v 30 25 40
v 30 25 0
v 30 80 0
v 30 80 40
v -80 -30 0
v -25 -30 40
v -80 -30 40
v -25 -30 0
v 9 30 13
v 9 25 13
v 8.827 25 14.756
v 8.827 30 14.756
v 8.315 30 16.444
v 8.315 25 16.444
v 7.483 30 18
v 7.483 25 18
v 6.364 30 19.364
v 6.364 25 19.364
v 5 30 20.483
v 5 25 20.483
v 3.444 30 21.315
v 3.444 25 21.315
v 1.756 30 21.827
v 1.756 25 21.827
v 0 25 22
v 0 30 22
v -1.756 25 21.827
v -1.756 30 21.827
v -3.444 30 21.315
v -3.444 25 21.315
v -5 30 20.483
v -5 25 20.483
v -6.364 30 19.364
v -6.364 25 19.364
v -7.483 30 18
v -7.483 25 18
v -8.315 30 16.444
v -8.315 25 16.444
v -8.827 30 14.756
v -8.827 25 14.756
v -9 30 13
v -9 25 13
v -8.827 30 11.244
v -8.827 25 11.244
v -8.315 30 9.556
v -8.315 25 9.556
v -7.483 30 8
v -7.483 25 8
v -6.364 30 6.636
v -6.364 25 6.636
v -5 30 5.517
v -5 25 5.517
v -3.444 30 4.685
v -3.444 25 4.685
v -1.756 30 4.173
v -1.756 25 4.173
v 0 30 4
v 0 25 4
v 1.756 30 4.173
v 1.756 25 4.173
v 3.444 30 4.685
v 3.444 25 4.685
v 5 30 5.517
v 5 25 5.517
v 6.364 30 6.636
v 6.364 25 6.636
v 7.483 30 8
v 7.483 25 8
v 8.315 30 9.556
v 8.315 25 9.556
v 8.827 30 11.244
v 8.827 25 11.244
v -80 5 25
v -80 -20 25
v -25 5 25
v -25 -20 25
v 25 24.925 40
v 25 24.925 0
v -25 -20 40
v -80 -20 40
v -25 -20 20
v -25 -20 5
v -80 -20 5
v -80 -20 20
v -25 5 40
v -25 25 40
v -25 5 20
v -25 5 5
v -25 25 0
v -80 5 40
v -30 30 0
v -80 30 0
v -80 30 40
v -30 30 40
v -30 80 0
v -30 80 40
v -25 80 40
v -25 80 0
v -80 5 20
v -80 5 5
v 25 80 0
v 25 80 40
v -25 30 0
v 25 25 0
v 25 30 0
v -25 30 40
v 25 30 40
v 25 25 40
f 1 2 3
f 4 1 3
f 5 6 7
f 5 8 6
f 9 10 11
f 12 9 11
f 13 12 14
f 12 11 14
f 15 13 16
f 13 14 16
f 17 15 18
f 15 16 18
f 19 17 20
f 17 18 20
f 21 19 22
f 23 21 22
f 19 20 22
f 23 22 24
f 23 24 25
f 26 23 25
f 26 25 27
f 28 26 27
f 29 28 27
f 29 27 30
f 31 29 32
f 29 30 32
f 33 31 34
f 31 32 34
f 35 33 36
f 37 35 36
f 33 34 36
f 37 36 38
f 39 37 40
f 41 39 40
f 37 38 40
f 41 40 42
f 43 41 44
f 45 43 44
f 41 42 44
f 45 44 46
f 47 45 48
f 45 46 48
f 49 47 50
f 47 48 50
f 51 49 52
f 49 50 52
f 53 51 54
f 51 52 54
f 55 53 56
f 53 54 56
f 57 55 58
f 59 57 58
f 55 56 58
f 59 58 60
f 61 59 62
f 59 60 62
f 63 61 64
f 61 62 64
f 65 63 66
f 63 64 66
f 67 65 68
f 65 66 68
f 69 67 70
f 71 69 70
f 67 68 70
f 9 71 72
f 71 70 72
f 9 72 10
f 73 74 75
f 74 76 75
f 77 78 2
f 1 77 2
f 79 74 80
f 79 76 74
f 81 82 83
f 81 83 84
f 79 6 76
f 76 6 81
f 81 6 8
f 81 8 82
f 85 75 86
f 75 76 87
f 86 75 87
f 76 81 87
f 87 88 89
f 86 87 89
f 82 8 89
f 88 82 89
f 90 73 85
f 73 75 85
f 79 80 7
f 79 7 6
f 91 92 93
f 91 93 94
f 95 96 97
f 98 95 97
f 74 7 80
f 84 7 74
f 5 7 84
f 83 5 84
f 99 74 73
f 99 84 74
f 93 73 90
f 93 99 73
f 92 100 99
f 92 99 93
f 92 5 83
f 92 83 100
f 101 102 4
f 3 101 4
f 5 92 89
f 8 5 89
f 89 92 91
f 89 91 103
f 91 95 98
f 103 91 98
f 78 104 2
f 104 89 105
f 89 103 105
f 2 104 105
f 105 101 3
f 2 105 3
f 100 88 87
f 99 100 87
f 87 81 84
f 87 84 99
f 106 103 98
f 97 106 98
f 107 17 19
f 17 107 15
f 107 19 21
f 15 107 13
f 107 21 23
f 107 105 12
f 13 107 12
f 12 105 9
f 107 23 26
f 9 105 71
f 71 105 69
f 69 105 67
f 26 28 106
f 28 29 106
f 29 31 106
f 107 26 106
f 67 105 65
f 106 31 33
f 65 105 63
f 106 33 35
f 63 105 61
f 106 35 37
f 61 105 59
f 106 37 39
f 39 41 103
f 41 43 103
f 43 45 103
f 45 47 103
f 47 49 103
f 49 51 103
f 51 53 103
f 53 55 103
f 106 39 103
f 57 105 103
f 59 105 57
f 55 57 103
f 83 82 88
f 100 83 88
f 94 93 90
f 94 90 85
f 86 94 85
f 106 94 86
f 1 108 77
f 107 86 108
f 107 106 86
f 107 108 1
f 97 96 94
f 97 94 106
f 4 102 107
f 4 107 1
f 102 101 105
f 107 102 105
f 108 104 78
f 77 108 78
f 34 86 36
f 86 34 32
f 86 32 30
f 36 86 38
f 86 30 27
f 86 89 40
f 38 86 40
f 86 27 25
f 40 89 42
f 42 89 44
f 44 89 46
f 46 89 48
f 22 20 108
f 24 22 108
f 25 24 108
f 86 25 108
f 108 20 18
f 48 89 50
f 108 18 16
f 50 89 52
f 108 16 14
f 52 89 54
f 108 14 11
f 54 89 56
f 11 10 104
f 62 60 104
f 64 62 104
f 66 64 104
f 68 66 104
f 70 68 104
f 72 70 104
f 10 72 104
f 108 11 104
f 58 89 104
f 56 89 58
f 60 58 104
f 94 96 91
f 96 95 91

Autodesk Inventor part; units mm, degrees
ref_plane "YZ Plane" through (0, 0, 0) normal (1, 0, 0) x (0, 1, 0)
ref_plane "XZ Plane" through (0, 0, 0) normal (0, 1, 0) x (-1, 0, 0)
ref_plane "XY Plane" through (0, 0, 0) normal (0, 0, 1) x (1, 0, 0)
sketch "Sketch1" plane through (0, 0, 0) normal (0, 0, 1) x (1, 0, 0)
  line L0 (-25, 25) -> (25, 25)
  line L1 (25, 25) -> (25, -30)
  line L2 (30, -25) -> (-30, -25)
  line L3 (-25, -30) -> (-25, 80)
  line L4 (-25, 25) -> (25, -25) construction
  line L5 (25, 25) -> (-25, -25) construction
  line L6 (25, 25) -> (-51, 25)
  line L7 (25, 80) -> (25, 25)
  line L8 (-51, 25) -> (-75, 25)
  line L9 (-75, 25) -> (-75, -25)
  line L10 (-75, -25) -> (-30, -25)
  line L11 (30, 30) -> (-30, 30)
  line L12 (-30, 30) -> (-30, -30)
  line L13 (-30, -30) -> (30, -30)
  line L14 (30, -30) -> (30, 30)
  line L15 (30, 25) -> (30, 80)
  line L16 (-30, 80) -> (-30, 25)
  line L17 (-80, -30) -> (-80, 30)
  line L18 (-80, 30) -> (-30, 30)
  line L19 (-30, -30) -> (-80, -30)
  line L20 (-30, 80) -> (30, 80)
  line L21 (24.924, 24.924) -> (30, 25)
  point P0 (0, 0)
  point P1 (25, 30)
  point P2 (-30, 25)
  point P3 (-25, 30)
  point P4 (25, 24.9251)
  dimension "d4" = 5
  dimension "d7" = 50
  dimension "d8" = 0
  dimension "d9" = 5
  dimension "d12" = 55
  dimension "d13" = 60
  dimension "d14" = 105
  dimension "d15" = 50
  dimension "d18" = 110
  dimension "d19" = 3.5355
  dimension "d20" = 38.8909
  dimension "d21" = 81
extrude "Extrusion1" add sketch "Sketch1" along normal blind 40 contours L3 L11 L7 L0 | L6 L12 L11 L3 | L3 L2 L12 L6 | L7 L11 L14 L21 L1 | L3 L13 L12 L2 | L11 L16 L20 L3 | L12 L10 L9 L8 L6 | L6 L8 L9 L10 L12 L19 L17 L18 | L7 L20 L15 L11
sketch "Sketch2" plane through (-25, 25, 0) normal (0, -1, 0) x (1, 0, 0)
  circle A0 centre (25, 13) radius 9
  line L0 (0, 0) -> (50, 0) projected
  point P0 (25, 0)
  dimension "d24" = 18
  dimension "d25" = 13
extrude "Extrusion2" cut sketch "Sketch2" against normal blind 40
sketch "Sketch3" plane through (-25, -30, 0) normal (1, 0, 0) x (0, 0, -1)
  line L0 (0, 0) -> (-40, 0) projected
  line L1 (0, 55) -> (-40, 55) projected
  line L2 (0, 0) -> (-5, 0)
  line L3 (-5, 0) -> (-5, 55)
  line L4 (-5, 55) -> (0, 55)
  line L5 (0, 55) -> (0, 0)
  line L6 (-5, 0) -> (-20, 0)
  line L7 (-20, 0) -> (-20, 55)
  line L8 (-20, 55) -> (-5, 55)
  line L9 (-5, 55) -> (-5, 0)
  line L10 (-20, 0) -> (-25, 0)
  line L11 (-25, 0) -> (-25, 55)
  line L12 (-25, 55) -> (-20, 55)
  line L13 (-20, 55) -> (-20, 0)
  line L14 (-25, 0) -> (-40, 0)
  line L15 (-40, 0) -> (-40, 55)
  line L16 (-40, 55) -> (-25, 55)
  line L17 (-25, 55) -> (-25, 0)
  line L18 (-40, 0) -> (0, 0)
  line L19 (0, 0) -> (0, 10)
  line L20 (0, 10) -> (-40, 10)
  line L21 (-40, 10) -> (-40, 0)
  line L22 (-40, 55) -> (-20, 55)
  line L23 (-20, 55) -> (-20, 37.9712)
  line L24 (-20, 37.9712) -> (-40, 37.9712)
  line L25 (-40, 37.9712) -> (-40, 55)
  line L26 (-40, 55) -> (-5, 55)
  line L27 (-5, 55) -> (-5, 35)
  line L28 (-5, 35) -> (-40, 35)
  line L29 (-40, 35) -> (-40, 55)
  point P0 (0, 30)
  point P1 (-20, 10)
  point P2 (-5, 10)
  point P3 (-25, 10)
  point P4 (-20, 35)
  point P5 (-25, 35)
  dimension "d28" = 5
  dimension "d29" = 15
  dimension "d30" = 5
  dimension "d33" = 10
  dimension "d34" = 20
  dimension "d35" = 20
extrude "Extrusion3" cut sketch "Sketch3" against normal through all contours L20 L7 L28 L3 | L20 L15 L28 L11
